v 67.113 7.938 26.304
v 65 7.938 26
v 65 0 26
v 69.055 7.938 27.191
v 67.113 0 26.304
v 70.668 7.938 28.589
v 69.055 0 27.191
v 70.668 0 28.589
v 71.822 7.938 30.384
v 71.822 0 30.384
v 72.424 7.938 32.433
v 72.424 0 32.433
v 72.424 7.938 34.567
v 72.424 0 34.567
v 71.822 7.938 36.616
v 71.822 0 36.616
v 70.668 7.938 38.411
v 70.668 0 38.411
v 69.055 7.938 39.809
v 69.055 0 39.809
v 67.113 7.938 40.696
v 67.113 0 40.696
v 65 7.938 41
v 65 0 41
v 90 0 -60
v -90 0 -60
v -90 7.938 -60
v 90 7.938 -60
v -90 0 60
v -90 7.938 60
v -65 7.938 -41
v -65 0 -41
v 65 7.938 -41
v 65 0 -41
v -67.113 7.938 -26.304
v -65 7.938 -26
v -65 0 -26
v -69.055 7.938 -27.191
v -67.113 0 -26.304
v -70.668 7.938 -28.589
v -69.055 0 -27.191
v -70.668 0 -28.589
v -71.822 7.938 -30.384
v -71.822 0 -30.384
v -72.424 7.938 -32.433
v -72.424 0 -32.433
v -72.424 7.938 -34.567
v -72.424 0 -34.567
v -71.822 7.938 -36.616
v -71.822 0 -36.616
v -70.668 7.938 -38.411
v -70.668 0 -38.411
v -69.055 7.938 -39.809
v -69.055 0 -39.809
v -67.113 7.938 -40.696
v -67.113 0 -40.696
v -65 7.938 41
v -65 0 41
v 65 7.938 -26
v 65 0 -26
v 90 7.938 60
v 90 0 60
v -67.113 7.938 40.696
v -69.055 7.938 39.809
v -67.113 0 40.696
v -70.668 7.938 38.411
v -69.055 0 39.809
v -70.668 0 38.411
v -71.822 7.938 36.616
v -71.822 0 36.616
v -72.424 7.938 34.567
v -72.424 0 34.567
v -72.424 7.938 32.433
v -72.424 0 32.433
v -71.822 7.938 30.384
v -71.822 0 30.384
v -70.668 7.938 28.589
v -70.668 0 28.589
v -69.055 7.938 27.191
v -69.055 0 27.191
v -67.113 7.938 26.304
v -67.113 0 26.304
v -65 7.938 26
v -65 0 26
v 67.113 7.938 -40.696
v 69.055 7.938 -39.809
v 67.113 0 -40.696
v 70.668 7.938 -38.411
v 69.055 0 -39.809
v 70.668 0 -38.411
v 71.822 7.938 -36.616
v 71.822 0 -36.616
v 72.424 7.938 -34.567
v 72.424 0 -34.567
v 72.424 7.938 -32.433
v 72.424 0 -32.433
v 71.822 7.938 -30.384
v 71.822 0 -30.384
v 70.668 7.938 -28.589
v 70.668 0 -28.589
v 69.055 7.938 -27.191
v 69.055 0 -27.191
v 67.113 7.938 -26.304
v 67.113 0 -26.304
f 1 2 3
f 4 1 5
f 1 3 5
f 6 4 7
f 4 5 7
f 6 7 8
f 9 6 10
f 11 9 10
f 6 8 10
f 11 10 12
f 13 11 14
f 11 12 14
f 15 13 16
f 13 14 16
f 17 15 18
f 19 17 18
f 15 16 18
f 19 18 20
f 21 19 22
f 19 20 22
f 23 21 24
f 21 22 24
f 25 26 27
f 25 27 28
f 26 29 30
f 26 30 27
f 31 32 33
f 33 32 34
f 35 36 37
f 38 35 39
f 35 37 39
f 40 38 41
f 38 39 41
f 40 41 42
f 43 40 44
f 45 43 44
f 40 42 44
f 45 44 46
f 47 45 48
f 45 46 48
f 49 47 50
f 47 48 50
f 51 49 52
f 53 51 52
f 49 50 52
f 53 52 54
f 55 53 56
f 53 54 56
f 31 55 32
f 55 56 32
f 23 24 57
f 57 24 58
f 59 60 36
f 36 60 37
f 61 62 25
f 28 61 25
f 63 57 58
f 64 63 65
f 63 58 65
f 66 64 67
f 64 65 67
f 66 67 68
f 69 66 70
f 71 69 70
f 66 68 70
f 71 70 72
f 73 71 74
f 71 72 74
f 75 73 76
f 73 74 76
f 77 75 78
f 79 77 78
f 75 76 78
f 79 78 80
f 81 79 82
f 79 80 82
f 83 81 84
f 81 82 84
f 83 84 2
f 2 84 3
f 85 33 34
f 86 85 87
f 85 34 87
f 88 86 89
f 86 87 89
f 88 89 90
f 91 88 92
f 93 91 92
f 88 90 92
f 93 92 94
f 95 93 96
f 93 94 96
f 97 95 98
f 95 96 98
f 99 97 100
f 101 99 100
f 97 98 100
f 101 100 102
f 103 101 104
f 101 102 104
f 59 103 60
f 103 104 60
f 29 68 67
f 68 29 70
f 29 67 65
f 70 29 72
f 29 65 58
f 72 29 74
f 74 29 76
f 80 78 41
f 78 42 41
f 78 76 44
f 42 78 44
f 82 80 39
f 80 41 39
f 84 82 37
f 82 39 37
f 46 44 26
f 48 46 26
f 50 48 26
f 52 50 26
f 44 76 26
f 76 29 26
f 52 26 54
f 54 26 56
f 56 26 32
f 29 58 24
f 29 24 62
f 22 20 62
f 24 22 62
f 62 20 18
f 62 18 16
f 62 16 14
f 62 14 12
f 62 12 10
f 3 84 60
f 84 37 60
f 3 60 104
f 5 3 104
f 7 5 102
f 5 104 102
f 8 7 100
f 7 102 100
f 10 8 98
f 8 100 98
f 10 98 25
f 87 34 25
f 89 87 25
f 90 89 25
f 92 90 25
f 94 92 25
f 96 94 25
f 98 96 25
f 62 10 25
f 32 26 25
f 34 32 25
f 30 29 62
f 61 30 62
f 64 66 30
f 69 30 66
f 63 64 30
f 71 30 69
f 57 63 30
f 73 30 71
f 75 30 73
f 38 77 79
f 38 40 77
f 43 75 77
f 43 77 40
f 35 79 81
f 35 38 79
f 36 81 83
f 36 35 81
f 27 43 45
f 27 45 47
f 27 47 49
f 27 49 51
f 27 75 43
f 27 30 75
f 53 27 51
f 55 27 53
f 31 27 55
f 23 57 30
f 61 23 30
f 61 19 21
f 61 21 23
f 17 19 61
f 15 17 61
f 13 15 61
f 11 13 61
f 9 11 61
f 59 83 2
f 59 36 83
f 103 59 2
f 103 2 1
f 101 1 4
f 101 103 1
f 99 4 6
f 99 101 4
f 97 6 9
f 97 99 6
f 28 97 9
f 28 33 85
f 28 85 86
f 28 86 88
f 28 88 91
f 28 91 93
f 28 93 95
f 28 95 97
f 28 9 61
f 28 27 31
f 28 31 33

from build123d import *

# Parameters (mm, degrees)
CROQUIS1_W              = 180
CROQUIS1_H              = 120
SALIENTE_EXTRUIR1_DEPTH = 7.9375


with BuildPart() as part:
    # Croquis1 → Saliente-Extruir1 (new body)
    with BuildSketch(Plane(origin=(0, 0, 0), x_dir=(1, 0, 0), z_dir=(0, 1, 0))):
        Rectangle(CROQUIS1_W, CROQUIS1_H)
        with BuildLine():
            Line((-65, -26), (65, -26))
            ThreePointArc((65, -26), (72.5, -33.5), (65, -41))
            Line((65, -41), (-65, -41))
            ThreePointArc((-65, -41), (-72.5, -33.5), (-65, -26))
        make_face(mode=Mode.SUBTRACT)
        with BuildLine():
            Line((-65, 41), (65, 41))
            ThreePointArc((65, 41), (72.5, 33.5), (65, 26))
            Line((65, 26), (-65, 26))
            ThreePointArc((-65, 26), (-72.5, 33.5), (-65, 41))
        make_face(mode=Mode.SUBTRACT)
    extrude(amount=SALIENTE_EXTRUIR1_DEPTH)


solid = part.part
